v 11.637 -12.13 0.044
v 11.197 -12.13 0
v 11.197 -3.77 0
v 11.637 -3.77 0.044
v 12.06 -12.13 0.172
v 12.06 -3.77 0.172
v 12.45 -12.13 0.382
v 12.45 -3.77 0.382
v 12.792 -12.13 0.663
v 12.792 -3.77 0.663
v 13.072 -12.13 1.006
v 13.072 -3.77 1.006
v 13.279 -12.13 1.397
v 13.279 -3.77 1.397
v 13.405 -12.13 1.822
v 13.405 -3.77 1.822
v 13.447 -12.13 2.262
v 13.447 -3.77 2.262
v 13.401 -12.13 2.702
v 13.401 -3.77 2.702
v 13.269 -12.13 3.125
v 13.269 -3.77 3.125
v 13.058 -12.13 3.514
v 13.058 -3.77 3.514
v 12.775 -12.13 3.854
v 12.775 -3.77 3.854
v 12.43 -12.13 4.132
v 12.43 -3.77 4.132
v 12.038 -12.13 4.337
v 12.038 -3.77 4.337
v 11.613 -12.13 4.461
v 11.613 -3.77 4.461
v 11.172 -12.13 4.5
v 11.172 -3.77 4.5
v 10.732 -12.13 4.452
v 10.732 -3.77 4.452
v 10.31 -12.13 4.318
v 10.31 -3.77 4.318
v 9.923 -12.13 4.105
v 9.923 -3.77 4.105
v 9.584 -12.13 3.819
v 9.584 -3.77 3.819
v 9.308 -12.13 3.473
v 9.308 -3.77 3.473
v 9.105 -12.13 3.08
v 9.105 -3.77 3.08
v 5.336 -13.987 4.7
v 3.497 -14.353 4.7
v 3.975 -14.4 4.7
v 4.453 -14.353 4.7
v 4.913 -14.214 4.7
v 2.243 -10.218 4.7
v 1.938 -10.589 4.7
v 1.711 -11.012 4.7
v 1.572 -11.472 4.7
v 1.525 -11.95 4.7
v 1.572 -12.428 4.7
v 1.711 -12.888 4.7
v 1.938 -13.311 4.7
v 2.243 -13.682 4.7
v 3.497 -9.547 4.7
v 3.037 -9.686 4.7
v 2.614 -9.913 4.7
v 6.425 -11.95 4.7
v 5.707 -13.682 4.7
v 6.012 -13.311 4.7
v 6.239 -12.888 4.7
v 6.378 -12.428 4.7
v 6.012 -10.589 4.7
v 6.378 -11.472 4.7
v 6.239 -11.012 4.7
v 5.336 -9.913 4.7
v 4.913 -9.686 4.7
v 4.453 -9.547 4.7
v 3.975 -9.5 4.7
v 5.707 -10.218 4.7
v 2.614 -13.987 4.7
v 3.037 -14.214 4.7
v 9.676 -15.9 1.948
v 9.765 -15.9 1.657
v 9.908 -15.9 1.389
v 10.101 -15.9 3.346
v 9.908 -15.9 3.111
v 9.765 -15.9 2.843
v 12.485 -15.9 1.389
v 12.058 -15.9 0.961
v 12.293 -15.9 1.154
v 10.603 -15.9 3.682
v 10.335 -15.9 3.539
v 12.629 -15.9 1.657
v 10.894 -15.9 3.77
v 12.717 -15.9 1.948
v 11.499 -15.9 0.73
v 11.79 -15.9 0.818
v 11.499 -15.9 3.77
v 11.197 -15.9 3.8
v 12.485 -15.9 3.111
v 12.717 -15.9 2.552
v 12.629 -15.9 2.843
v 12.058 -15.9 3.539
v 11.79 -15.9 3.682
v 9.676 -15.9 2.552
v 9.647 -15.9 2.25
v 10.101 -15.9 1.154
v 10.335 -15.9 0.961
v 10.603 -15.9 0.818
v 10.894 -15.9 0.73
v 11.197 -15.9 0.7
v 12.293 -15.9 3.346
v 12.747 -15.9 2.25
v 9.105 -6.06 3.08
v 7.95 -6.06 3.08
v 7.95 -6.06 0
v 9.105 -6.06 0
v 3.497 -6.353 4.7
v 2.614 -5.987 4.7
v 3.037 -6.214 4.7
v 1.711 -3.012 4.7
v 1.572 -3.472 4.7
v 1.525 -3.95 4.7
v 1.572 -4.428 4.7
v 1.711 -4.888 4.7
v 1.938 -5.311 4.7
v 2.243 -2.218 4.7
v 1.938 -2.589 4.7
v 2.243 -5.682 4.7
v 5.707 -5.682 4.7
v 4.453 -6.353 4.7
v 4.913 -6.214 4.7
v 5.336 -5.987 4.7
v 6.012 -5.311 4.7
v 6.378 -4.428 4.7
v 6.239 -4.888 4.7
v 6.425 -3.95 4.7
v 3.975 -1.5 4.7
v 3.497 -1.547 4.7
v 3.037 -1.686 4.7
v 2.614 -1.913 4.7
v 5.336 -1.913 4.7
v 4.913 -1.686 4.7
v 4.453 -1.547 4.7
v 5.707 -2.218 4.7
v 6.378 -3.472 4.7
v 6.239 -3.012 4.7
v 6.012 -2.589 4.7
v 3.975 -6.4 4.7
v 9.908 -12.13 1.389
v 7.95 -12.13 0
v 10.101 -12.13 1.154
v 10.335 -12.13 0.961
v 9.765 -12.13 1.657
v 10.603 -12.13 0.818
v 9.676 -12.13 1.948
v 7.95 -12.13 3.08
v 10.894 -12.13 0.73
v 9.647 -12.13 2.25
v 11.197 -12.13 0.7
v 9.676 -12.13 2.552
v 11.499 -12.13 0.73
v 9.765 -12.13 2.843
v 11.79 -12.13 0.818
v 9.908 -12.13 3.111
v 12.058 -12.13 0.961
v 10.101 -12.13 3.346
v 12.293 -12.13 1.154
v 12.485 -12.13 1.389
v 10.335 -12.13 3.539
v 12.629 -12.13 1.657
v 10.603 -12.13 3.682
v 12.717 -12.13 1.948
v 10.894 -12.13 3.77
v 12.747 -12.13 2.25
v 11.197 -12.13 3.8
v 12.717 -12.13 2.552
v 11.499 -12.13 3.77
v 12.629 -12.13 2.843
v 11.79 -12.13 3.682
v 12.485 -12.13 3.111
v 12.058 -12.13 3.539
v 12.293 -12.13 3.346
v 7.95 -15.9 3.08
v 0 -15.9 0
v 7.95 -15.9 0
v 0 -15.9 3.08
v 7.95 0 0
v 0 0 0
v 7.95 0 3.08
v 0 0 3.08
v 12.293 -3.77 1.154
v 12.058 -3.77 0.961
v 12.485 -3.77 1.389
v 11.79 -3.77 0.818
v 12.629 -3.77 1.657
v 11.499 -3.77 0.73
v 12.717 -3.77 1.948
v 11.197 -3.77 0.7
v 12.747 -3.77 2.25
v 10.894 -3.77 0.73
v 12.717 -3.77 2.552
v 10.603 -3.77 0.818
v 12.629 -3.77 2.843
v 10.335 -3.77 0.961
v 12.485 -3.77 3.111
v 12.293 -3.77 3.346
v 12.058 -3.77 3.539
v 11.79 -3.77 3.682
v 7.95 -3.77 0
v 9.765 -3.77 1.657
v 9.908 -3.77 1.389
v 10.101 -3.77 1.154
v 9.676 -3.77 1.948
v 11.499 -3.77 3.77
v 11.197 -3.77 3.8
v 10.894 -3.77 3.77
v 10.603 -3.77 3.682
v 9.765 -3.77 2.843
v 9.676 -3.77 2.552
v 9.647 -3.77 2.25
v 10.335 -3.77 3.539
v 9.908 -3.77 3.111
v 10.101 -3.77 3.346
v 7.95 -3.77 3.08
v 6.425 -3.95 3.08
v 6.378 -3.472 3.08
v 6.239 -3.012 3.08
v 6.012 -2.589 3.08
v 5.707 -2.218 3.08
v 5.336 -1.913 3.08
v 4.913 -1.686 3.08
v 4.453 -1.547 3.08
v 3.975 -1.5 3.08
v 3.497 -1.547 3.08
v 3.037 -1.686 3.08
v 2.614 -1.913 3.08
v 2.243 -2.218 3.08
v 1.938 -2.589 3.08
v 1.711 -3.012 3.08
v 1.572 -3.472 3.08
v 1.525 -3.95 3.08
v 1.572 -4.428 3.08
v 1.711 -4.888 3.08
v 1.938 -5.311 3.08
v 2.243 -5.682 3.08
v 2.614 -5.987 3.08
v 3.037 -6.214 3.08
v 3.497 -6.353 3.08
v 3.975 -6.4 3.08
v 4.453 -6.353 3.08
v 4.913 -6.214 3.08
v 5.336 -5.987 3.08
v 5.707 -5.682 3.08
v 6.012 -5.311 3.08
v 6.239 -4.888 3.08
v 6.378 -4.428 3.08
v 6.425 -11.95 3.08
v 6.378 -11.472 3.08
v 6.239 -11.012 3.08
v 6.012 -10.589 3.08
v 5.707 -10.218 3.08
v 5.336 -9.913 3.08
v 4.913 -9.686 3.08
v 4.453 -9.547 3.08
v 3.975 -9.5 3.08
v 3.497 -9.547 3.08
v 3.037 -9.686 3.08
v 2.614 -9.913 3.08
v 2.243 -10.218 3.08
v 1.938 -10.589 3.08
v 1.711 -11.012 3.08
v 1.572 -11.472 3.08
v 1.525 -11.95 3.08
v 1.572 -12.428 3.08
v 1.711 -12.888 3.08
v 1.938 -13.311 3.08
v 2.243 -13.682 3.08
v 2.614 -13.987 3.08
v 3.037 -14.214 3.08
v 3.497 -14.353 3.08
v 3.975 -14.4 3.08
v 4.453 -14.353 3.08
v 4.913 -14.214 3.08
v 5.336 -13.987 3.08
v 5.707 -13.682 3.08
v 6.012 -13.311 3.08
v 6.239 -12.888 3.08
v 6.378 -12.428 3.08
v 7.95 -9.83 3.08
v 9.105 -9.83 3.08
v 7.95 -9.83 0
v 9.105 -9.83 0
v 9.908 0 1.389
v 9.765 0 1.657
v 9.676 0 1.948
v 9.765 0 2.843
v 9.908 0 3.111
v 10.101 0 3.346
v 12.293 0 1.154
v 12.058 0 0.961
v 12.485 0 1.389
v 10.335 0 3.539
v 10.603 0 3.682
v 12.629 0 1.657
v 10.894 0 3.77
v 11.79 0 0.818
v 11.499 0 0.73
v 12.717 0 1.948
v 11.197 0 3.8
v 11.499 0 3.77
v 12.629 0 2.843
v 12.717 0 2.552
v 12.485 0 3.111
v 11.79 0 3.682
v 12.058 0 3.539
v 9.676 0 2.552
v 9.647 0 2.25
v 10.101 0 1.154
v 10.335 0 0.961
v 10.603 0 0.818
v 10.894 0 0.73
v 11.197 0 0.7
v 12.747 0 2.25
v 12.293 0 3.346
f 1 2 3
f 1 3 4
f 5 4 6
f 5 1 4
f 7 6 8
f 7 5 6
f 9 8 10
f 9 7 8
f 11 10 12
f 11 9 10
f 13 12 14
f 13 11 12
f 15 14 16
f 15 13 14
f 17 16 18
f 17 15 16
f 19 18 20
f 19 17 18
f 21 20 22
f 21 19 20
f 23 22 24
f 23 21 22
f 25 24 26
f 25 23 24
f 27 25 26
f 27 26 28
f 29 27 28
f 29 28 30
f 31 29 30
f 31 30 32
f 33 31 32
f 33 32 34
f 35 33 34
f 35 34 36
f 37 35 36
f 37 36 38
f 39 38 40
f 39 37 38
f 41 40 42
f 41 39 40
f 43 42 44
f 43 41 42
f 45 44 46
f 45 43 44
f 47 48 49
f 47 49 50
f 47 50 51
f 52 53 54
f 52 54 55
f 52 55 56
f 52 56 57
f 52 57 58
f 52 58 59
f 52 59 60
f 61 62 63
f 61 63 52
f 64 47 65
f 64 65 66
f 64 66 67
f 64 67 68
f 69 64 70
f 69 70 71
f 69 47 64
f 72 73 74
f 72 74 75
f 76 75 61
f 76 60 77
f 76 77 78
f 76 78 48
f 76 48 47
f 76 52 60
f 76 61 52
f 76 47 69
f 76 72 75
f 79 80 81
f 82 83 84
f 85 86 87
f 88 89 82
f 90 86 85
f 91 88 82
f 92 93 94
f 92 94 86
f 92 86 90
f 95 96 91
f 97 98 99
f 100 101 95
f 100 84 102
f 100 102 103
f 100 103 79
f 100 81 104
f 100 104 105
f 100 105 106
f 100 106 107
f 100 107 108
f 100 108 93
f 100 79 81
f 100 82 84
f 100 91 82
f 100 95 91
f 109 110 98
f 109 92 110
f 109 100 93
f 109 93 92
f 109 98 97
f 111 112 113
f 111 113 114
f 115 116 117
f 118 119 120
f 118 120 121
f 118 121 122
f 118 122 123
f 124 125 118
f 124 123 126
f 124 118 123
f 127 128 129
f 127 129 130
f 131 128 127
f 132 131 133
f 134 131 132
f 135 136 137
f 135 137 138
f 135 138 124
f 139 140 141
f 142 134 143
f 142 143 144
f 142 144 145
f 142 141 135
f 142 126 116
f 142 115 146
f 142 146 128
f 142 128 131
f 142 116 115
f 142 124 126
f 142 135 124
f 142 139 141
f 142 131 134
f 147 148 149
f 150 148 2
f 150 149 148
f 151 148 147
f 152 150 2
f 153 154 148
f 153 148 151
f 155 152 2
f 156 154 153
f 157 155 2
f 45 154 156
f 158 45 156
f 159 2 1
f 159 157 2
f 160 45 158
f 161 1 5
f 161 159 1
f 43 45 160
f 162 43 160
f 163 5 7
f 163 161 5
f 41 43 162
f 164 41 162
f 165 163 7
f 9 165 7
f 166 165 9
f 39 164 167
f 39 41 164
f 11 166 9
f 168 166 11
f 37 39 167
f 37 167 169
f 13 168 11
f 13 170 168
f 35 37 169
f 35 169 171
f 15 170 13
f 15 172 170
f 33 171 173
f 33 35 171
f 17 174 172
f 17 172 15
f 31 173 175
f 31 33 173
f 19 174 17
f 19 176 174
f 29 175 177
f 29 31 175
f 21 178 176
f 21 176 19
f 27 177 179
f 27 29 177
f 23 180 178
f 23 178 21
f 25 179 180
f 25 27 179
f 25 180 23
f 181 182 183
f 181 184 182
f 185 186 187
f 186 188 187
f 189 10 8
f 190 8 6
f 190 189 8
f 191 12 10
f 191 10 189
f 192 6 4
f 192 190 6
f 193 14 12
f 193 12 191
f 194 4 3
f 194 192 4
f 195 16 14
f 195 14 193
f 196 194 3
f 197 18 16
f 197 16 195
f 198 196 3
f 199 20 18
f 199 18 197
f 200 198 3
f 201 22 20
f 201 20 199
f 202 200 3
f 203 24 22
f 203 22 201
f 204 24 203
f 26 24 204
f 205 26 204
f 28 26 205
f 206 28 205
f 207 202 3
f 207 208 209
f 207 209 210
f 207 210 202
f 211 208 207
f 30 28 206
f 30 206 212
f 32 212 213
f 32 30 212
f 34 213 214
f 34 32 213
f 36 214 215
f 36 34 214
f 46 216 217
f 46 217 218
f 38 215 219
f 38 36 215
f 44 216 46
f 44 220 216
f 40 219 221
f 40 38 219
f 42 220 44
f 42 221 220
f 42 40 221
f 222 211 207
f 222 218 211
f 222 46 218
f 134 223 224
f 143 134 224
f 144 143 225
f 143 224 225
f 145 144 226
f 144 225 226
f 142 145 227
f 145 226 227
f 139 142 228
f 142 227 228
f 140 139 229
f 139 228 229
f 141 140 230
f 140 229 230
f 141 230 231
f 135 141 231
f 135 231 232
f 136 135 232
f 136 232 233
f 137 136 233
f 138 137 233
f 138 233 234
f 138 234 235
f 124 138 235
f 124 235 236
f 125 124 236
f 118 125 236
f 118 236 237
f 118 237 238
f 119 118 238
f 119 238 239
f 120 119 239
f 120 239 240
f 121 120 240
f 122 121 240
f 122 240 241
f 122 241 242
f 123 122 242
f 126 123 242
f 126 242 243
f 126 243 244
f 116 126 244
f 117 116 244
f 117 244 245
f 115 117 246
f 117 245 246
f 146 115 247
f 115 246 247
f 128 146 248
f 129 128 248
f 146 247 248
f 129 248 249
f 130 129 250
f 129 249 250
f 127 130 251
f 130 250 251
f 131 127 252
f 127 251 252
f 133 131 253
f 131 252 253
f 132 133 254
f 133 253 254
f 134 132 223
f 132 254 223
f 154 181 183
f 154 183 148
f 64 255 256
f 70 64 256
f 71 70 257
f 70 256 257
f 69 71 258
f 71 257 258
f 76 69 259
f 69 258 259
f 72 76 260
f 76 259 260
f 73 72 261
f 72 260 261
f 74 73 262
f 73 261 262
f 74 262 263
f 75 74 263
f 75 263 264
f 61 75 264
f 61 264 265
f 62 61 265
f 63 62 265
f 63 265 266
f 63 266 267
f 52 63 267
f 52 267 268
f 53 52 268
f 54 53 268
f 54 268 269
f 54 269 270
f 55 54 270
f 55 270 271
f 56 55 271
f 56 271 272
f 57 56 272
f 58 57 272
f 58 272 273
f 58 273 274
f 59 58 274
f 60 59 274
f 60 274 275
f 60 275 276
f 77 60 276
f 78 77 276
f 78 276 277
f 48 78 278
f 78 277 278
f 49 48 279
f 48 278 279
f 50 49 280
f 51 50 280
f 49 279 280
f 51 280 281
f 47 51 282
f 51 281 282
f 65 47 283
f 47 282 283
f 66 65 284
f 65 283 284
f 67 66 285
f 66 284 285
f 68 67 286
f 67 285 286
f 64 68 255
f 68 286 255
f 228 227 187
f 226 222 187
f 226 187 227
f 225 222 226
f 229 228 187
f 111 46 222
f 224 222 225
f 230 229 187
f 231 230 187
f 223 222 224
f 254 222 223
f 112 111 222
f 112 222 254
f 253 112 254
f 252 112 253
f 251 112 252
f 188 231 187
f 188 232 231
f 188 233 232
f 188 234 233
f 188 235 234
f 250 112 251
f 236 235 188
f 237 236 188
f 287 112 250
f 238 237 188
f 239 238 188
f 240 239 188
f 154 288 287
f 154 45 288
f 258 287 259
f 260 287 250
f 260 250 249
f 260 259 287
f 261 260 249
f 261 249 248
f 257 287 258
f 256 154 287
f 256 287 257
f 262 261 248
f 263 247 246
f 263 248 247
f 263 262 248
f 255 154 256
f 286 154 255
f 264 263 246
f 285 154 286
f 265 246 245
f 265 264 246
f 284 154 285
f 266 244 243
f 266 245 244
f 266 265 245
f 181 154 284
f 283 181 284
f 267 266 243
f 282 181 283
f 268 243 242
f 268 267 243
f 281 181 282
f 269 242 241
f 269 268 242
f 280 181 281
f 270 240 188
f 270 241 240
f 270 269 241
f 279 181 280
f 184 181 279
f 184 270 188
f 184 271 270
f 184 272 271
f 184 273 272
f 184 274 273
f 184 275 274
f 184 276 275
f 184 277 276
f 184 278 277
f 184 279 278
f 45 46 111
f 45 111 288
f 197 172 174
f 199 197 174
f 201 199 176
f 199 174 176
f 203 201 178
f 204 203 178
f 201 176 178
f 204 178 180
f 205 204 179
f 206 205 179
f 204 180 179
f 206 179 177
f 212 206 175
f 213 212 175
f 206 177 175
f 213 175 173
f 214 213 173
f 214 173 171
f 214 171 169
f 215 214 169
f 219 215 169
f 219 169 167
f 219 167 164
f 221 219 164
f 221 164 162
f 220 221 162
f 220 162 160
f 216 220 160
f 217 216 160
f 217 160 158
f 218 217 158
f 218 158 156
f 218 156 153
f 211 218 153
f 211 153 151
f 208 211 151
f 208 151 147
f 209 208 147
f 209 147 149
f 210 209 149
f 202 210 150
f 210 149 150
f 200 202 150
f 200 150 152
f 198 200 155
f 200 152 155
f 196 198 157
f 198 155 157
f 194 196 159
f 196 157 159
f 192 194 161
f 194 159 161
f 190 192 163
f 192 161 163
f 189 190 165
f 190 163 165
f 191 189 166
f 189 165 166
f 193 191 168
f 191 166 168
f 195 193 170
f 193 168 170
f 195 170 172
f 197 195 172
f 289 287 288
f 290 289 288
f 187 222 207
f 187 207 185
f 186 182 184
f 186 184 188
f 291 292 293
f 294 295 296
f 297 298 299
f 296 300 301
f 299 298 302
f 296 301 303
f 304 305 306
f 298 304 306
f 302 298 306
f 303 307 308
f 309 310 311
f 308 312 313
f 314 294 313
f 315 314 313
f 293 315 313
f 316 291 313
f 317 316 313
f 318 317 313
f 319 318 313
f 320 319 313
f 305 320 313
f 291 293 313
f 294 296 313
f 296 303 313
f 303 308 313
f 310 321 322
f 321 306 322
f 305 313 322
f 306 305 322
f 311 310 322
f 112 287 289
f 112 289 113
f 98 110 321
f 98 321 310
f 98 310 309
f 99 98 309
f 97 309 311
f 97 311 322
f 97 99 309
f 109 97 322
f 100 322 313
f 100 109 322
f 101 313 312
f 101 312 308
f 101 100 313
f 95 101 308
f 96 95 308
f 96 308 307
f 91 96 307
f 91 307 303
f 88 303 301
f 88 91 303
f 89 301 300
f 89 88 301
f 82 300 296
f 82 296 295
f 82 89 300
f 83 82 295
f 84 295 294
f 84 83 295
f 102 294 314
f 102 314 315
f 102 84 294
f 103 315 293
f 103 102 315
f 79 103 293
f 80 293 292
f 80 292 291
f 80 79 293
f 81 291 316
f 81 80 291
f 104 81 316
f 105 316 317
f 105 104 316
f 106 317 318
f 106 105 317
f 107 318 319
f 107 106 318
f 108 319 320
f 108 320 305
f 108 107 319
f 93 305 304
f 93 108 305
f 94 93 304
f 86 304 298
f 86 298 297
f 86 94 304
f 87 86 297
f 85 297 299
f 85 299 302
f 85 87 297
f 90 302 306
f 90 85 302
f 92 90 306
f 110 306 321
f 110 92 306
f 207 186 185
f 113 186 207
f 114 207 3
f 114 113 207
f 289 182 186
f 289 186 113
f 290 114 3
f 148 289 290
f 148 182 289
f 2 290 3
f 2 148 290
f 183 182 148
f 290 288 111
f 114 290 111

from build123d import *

# Parameters (mm, degrees)
F0_W      = 7.95
F0_H      = 15.9
F0_R      = 2.45
F1_DEPTH  = 3.08
F2_DEPTH  = 4.7
F3_R      = 1.55
F4_DEPTH  = 15.9
F5_W      = 1.155221
F5_H      = 3.77
F6_DEPTH  = 25
F7_DEPTH  = 15.9
F8_R      = 1.55
F9_DEPTH  = 3.77
F10_R     = 1.55
F11_DEPTH = 3.77


with BuildPart() as f1:
    # F0 (on Top) → F1 (new body)
    with BuildSketch(Plane.XY):
        with Locations((3.975, -7.95)):
            Rectangle(F0_W, F0_H)
        with Locations((3.975, -11.95)):
            Circle(F0_R, mode=Mode.SUBTRACT)
        with Locations((3.975, -3.95)):
            Circle(F0_R, mode=Mode.SUBTRACT)
    extrude(amount=F1_DEPTH)

    # F0 (on Top) → F2 (join)
    with BuildSketch(Plane.XY):
        with Locations((3.975, -11.95)):
            Circle(F0_R)
        with Locations((3.975, -3.95)):
            Circle(F0_R)
    extrude(amount=F2_DEPTH)

    # F3 (on face) → F4 (join)
    with BuildSketch(Plane.XZ.offset(15.9)):
        with BuildLine():
            Line((7.95, 0), (11.196537, 0))
            ThreePointArc((11.196537, 0), (13.057988, 3.513922), (9.105221, 3.08))
            Line((9.105221, 3.08), (7.95, 3.08))
            Line((7.95, 3.08), (7.95, 0))
        make_face()
        with Locations((11.196537, 2.25)):
            Circle(F3_R, mode=Mode.SUBTRACT)
    extrude(amount=-F4_DEPTH)

    # F5 (on face) → F6 (cut)
    with BuildSketch(Plane.XY.offset(3.08)):
        with Locations((8.52761, -14.015)):
            Rectangle(F5_W, F5_H)
        with Locations((8.52761, -7.945)):
            Rectangle(F5_W, F5_H)
        with Locations((8.52761, -1.885)):
            Rectangle(F5_W, F5_H)
    extrude(amount=-F6_DEPTH, mode=Mode.SUBTRACT)

    # F8 (on face) → F9 (cut)
    with BuildSketch(Plane.XZ.offset(15.9)):
        with BuildLine():
            Line((7.950221, 0), (11.196537, 0))
            ThreePointArc((11.196537, 0), (13.057988, 3.513922), (9.105221, 3.08))
            Line((9.105221, 3.08), (7.950221, 3.08))
            Line((7.950221, 3.08), (7.950221, 0))
        make_face()
        with Locations((11.196537, 2.25)):
            Circle(F8_R, mode=Mode.SUBTRACT)
    extrude(amount=-F9_DEPTH, mode=Mode.SUBTRACT)

    # F10 (on face) → F11 (cut)
    with BuildSketch(Plane(origin=(0, 0, 0), x_dir=(-1, 0, 0), z_dir=(0, 1, 0))):
        with BuildLine():
            Line((-7.955221, 3.08), (-9.105221, 3.08))
            ThreePointArc((-9.105221, 3.08), (-13.057988, 3.513922), (-11.196537, 0))
            Line((-11.196537, 0), (-7.955221, 0))
            Line((-7.955221, 0), (-7.955221, 3.08))
        make_face()
        with Locations((-11.196537, 2.25)):
            Circle(F10_R, mode=Mode.SUBTRACT)
    extrude(amount=-F11_DEPTH, mode=Mode.SUBTRACT)


with BuildPart() as f7:
    # F3 (on face) → F7 (new body)
    with BuildSketch(Plane.XZ.offset(15.9)):
        with Locations((11.196537, 2.25)):
            Circle(F3_R)
    extrude(amount=-F7_DEPTH)


solid = Compound([f1.part, f7.part])
